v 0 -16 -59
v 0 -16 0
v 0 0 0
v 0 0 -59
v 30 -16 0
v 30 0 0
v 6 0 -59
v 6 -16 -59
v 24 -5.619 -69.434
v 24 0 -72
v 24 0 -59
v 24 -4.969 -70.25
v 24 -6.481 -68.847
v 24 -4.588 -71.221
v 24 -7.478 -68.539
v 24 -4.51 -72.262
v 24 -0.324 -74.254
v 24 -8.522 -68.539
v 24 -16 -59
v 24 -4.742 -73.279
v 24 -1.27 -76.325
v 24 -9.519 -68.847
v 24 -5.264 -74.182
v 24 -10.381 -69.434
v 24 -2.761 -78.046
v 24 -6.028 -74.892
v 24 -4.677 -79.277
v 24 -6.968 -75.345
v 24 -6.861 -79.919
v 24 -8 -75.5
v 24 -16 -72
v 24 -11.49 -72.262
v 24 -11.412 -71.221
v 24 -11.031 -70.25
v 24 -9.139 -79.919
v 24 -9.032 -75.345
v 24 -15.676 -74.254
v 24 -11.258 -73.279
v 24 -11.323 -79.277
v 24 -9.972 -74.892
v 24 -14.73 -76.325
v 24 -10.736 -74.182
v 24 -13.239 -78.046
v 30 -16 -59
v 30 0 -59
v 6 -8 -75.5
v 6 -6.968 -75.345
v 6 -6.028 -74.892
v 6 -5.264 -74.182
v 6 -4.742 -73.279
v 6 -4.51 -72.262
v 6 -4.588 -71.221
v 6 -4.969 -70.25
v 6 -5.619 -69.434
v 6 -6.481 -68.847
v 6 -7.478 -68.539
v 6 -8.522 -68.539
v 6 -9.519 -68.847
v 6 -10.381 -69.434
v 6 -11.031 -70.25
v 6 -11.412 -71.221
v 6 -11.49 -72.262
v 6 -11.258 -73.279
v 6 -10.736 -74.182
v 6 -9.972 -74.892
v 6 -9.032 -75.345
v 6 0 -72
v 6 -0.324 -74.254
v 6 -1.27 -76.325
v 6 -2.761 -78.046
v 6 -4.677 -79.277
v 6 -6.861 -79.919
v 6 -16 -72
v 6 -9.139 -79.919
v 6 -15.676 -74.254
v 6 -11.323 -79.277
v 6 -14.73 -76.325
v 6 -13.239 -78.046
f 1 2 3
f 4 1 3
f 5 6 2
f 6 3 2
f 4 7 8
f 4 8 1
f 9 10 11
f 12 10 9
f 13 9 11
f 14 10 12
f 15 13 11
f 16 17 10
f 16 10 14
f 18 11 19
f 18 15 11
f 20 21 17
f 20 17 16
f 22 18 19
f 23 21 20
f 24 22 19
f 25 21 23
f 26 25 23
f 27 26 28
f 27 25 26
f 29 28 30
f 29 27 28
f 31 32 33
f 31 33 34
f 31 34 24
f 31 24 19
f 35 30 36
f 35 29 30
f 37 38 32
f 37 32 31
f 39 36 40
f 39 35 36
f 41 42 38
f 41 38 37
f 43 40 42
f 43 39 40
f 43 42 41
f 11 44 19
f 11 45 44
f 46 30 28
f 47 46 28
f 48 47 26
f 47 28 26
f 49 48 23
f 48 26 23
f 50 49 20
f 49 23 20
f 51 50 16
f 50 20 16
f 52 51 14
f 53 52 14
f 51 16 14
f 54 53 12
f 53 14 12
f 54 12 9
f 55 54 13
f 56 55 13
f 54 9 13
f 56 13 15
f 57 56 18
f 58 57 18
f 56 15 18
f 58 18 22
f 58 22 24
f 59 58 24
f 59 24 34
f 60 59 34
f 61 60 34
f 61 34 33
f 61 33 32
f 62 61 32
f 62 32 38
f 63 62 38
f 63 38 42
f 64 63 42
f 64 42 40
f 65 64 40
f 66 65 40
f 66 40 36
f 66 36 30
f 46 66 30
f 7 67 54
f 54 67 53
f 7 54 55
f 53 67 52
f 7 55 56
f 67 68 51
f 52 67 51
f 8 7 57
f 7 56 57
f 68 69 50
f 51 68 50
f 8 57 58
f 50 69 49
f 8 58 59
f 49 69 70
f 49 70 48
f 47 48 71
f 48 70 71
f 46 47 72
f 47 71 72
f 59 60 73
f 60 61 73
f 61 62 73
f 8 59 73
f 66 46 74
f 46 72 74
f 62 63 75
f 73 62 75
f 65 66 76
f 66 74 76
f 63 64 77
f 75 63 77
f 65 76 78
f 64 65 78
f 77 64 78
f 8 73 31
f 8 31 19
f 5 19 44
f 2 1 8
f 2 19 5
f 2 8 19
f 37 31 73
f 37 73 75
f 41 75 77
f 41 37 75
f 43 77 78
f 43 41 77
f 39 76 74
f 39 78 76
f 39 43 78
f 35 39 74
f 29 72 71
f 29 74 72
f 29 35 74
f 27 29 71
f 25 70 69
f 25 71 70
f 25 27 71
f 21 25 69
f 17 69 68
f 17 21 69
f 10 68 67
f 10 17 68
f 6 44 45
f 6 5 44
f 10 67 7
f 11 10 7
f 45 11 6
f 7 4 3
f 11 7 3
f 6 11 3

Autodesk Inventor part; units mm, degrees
ref_plane "YZ Plane" through (0, 0, 0) normal (1, 0, 0) x (0, 1, 0)
ref_plane "XZ Plane" through (0, 0, 0) normal (0, 1, 0) x (-1, 0, 0)
ref_plane "XY Plane" through (0, 0, 0) normal (0, 0, 1) x (1, 0, 0)
sketch "Boceto1" plane through (0, 0, 0) normal (1, 0, 0) x (0, 1, 0)
  line L0 (0, 0) -> (-16, 0)
  line L1 (-16, 0) -> (-16, -70)
  line L2 (0, -70) -> (0, 0)
  line L3 (0, -70) -> (0, -80)
  line L4 (0, -80) -> (-16, -80)
  line L5 (-16, -80) -> (-16, -70)
  dimension "d0" = 16
  dimension "d1" = 70
  dimension "d2" = 10
extrude "Extrusión1" add sketch "Boceto1" along normal blind 30
sketch "Boceto2" plane through (0, -16, -80) normal (0, 0, -1) x (-1, 0, 0)
  line L0 (0, 16) -> (-30, 16) projected
  line L1 (-15, 16) -> (-24, 16)
  line L2 (-24, 16) -> (-24, 0)
  line L3 (0, 0) -> (-30, 0) projected
  line L4 (-24, 0) -> (-30, 0)
  line L5 (-30, 16) -> (-30, 0) projected
  line L6 (-30, 0) -> (-30, 16)
  line L7 (-30, 16) -> (-24, 16)
  line L8 (-15, 16) -> (-6, 16)
  line L9 (-6, 16) -> (-6, 0)
  line L10 (0, 16) -> (0, 0) projected
  line L11 (-6, 0) -> (0, 0)
  line L12 (0, 0) -> (0, 16)
  line L13 (0, 16) -> (-6, 16)
  dimension "d5" = 9
  dimension "d6" = 9
extrude "Extrusión2" cut sketch "Boceto2" against normal blind 21 contours L10 L3 L9 L0 | L2 L3 L5 L0
sketch "Boceto3" plane through (24, -16, -80) normal (1, 0, 0) x (0, 0, -1)
  line L0 (-21, 16) -> (0, 16) projected
  line L1 (0, 16) -> (-8, 16)
  line L2 (-8, 16) -> (-8, 0)
  line L3 (0, 0) -> (-21, 0) projected
  arc A0 (-8, 0) -> (-8, 16) centre (-8, 8) ccw
  circle A1 centre (-8, 8) radius 3.5
  line L4 (0, 16) -> (0, 8)
  line L5 (0, 16) -> (0, 0) projected
  line L6 (0, 8) -> (0, 0)
  line L7 (0, 0) -> (-8, 0)
  point P0 (-80, 16)
  dimension "d9" = 8
  dimension "d10" = 7
extrude "Extrusión3" cut sketch "Boceto3" against normal blind 18 contours L0 L4 A0 | A1 L2 | L2 A1 | L5 L3 A0
properties part number "finger_long"
